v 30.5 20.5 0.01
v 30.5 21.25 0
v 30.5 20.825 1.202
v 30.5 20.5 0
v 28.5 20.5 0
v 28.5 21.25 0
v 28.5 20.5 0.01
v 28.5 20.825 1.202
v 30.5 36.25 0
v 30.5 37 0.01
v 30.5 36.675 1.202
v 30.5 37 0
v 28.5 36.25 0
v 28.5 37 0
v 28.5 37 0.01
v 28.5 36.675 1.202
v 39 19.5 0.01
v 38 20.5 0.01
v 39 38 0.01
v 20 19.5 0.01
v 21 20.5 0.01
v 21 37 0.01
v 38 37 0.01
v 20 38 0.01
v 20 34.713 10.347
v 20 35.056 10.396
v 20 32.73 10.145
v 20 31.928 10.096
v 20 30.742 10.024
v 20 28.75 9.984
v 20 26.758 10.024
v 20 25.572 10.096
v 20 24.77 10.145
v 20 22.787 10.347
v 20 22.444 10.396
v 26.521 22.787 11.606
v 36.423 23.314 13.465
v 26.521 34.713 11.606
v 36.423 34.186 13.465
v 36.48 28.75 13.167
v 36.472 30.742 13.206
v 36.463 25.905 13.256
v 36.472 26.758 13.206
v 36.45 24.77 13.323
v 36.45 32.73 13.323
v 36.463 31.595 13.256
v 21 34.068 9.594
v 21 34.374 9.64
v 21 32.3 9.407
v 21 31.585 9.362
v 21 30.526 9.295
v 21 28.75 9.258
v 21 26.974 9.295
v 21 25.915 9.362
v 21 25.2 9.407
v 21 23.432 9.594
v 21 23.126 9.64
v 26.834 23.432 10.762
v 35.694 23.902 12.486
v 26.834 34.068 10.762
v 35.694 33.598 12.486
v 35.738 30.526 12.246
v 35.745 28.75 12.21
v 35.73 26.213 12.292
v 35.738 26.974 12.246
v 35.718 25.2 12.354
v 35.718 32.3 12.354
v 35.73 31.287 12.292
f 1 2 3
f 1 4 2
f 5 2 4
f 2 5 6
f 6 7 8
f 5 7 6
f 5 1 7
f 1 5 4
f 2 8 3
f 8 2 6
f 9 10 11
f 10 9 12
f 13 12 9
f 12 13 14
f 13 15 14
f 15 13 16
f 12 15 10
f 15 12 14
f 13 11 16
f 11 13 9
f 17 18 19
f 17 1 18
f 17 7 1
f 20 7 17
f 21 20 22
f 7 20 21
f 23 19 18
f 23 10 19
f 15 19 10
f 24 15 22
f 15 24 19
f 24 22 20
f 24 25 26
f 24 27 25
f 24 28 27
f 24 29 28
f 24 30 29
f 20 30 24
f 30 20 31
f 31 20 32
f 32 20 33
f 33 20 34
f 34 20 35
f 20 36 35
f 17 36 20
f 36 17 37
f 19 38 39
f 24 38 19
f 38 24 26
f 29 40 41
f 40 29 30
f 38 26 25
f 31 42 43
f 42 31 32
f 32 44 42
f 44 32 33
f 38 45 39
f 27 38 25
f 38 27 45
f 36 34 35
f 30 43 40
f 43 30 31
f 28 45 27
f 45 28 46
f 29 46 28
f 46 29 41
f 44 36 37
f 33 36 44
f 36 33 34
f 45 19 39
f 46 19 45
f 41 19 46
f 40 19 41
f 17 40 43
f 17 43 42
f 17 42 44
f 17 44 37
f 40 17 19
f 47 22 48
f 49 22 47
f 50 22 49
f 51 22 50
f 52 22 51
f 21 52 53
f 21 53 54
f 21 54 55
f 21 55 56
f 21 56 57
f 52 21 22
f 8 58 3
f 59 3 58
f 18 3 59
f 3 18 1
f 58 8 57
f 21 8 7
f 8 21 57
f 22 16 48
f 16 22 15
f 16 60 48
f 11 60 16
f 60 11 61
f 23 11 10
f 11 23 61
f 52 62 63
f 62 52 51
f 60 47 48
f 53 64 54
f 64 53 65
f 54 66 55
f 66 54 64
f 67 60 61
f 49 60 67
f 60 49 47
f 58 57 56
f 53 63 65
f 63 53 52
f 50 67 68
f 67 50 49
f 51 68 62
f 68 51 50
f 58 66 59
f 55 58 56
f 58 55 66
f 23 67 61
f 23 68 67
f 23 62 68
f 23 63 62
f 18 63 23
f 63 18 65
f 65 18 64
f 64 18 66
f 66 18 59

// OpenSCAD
//measures are in millimeters
// Support not needed
// 210°   hotend
// 70°    bed
// 0.1    resolution
// 20mm/s speed
// 100%   infill
// Geeetech PLA
AY=18.5;
AX=19.0;
BY=12.5;
BLX=14.5;
EZ=11.0;
FLZ=14.0;
H=13.75;    //we need 1mm more
CYL_OFF_Z=50;
CYL_DEPTH=0.1;
CLIP_X=2;
CLIP_Y=0.75;
CLIP_H=3*CLIP_Y;
CORNER_RADIUS=0;    // we don't want 

WallThickness=1.00;
ClipWidth=2.2;
ClipDepth=1.0;

//ascfront=FLZ/sqrt(pow(FLZ,2)-pow(H,2));
//asctop=(H-EZ)/sqrt(pow(BLX,2)-pow((H-EZ),2));

alpha=asin((H-EZ)/BLX);
beta=asin(H/FLZ);
gamma=90-asin((0.5*(AY-BY))/EZ);

module keycap(){
	scale([AX/(AX+2*CORNER_RADIUS),AY/(AY+2*CORNER_RADIUS),1])
	translate([CORNER_RADIUS,CORNER_RADIUS,0.01])
	minkowski(){
		difference(){
			cube([AX,AY,H]);
			rotate(a=gamma,v=[1,0,0]) cube([100,100,100]);
			translate([0,AY,0]) rotate(a=90-gamma,v=[1,0,0]) cube([100,100,100]);
			translate([0,0,EZ]) rotate(a=-alpha,v=[0,1,0]) translate([-50,0,0]) cube([100,100,100]);
			translate([0,AY/2,EZ+CYL_OFF_Z]) rotate(a=90-alpha,v=[0,1,0]) cylinder(h=100,center=true,r=CYL_OFF_Z+CYL_DEPTH,$fa=1);
			translate([AX,0,0]) rotate(a=beta-90,v=[0,1,0]) cube([100,100,100]);
		}
		cylinder(h=0.10,r=CORNER_RADIUS,$fs=0.6);
		//rotate(a=90,v=[1,0,0]) cylinder(h=0.01,r=1,$fs=0.6);
	}
}

module clip(){
	difference(){
		cube([CLIP_X,CLIP_Y,CLIP_H]);
		translate([0,CLIP_Y,0]) rotate(a=asin(CLIP_Y/CLIP_H),v=[1,0,0]) cube([100,100,100]);
	}
}

i=1;
j=1;
translate([i*(AX+WallThickness),j*(AY+WallThickness),0]){

translate([(AX-CLIP_X)/2,WallThickness,0]) clip();
translate([0,AY,0]) mirror([0,1,0]) translate([(AX-CLIP_X)/2,WallThickness,0]) clip();

difference(){
	keycap();
	translate([WallThickness, WallThickness, 0]) scale(v=[1-2*WallThickness/AX, 1-2*WallThickness/AY, 1-WallThickness/H]) keycap();
}
}
